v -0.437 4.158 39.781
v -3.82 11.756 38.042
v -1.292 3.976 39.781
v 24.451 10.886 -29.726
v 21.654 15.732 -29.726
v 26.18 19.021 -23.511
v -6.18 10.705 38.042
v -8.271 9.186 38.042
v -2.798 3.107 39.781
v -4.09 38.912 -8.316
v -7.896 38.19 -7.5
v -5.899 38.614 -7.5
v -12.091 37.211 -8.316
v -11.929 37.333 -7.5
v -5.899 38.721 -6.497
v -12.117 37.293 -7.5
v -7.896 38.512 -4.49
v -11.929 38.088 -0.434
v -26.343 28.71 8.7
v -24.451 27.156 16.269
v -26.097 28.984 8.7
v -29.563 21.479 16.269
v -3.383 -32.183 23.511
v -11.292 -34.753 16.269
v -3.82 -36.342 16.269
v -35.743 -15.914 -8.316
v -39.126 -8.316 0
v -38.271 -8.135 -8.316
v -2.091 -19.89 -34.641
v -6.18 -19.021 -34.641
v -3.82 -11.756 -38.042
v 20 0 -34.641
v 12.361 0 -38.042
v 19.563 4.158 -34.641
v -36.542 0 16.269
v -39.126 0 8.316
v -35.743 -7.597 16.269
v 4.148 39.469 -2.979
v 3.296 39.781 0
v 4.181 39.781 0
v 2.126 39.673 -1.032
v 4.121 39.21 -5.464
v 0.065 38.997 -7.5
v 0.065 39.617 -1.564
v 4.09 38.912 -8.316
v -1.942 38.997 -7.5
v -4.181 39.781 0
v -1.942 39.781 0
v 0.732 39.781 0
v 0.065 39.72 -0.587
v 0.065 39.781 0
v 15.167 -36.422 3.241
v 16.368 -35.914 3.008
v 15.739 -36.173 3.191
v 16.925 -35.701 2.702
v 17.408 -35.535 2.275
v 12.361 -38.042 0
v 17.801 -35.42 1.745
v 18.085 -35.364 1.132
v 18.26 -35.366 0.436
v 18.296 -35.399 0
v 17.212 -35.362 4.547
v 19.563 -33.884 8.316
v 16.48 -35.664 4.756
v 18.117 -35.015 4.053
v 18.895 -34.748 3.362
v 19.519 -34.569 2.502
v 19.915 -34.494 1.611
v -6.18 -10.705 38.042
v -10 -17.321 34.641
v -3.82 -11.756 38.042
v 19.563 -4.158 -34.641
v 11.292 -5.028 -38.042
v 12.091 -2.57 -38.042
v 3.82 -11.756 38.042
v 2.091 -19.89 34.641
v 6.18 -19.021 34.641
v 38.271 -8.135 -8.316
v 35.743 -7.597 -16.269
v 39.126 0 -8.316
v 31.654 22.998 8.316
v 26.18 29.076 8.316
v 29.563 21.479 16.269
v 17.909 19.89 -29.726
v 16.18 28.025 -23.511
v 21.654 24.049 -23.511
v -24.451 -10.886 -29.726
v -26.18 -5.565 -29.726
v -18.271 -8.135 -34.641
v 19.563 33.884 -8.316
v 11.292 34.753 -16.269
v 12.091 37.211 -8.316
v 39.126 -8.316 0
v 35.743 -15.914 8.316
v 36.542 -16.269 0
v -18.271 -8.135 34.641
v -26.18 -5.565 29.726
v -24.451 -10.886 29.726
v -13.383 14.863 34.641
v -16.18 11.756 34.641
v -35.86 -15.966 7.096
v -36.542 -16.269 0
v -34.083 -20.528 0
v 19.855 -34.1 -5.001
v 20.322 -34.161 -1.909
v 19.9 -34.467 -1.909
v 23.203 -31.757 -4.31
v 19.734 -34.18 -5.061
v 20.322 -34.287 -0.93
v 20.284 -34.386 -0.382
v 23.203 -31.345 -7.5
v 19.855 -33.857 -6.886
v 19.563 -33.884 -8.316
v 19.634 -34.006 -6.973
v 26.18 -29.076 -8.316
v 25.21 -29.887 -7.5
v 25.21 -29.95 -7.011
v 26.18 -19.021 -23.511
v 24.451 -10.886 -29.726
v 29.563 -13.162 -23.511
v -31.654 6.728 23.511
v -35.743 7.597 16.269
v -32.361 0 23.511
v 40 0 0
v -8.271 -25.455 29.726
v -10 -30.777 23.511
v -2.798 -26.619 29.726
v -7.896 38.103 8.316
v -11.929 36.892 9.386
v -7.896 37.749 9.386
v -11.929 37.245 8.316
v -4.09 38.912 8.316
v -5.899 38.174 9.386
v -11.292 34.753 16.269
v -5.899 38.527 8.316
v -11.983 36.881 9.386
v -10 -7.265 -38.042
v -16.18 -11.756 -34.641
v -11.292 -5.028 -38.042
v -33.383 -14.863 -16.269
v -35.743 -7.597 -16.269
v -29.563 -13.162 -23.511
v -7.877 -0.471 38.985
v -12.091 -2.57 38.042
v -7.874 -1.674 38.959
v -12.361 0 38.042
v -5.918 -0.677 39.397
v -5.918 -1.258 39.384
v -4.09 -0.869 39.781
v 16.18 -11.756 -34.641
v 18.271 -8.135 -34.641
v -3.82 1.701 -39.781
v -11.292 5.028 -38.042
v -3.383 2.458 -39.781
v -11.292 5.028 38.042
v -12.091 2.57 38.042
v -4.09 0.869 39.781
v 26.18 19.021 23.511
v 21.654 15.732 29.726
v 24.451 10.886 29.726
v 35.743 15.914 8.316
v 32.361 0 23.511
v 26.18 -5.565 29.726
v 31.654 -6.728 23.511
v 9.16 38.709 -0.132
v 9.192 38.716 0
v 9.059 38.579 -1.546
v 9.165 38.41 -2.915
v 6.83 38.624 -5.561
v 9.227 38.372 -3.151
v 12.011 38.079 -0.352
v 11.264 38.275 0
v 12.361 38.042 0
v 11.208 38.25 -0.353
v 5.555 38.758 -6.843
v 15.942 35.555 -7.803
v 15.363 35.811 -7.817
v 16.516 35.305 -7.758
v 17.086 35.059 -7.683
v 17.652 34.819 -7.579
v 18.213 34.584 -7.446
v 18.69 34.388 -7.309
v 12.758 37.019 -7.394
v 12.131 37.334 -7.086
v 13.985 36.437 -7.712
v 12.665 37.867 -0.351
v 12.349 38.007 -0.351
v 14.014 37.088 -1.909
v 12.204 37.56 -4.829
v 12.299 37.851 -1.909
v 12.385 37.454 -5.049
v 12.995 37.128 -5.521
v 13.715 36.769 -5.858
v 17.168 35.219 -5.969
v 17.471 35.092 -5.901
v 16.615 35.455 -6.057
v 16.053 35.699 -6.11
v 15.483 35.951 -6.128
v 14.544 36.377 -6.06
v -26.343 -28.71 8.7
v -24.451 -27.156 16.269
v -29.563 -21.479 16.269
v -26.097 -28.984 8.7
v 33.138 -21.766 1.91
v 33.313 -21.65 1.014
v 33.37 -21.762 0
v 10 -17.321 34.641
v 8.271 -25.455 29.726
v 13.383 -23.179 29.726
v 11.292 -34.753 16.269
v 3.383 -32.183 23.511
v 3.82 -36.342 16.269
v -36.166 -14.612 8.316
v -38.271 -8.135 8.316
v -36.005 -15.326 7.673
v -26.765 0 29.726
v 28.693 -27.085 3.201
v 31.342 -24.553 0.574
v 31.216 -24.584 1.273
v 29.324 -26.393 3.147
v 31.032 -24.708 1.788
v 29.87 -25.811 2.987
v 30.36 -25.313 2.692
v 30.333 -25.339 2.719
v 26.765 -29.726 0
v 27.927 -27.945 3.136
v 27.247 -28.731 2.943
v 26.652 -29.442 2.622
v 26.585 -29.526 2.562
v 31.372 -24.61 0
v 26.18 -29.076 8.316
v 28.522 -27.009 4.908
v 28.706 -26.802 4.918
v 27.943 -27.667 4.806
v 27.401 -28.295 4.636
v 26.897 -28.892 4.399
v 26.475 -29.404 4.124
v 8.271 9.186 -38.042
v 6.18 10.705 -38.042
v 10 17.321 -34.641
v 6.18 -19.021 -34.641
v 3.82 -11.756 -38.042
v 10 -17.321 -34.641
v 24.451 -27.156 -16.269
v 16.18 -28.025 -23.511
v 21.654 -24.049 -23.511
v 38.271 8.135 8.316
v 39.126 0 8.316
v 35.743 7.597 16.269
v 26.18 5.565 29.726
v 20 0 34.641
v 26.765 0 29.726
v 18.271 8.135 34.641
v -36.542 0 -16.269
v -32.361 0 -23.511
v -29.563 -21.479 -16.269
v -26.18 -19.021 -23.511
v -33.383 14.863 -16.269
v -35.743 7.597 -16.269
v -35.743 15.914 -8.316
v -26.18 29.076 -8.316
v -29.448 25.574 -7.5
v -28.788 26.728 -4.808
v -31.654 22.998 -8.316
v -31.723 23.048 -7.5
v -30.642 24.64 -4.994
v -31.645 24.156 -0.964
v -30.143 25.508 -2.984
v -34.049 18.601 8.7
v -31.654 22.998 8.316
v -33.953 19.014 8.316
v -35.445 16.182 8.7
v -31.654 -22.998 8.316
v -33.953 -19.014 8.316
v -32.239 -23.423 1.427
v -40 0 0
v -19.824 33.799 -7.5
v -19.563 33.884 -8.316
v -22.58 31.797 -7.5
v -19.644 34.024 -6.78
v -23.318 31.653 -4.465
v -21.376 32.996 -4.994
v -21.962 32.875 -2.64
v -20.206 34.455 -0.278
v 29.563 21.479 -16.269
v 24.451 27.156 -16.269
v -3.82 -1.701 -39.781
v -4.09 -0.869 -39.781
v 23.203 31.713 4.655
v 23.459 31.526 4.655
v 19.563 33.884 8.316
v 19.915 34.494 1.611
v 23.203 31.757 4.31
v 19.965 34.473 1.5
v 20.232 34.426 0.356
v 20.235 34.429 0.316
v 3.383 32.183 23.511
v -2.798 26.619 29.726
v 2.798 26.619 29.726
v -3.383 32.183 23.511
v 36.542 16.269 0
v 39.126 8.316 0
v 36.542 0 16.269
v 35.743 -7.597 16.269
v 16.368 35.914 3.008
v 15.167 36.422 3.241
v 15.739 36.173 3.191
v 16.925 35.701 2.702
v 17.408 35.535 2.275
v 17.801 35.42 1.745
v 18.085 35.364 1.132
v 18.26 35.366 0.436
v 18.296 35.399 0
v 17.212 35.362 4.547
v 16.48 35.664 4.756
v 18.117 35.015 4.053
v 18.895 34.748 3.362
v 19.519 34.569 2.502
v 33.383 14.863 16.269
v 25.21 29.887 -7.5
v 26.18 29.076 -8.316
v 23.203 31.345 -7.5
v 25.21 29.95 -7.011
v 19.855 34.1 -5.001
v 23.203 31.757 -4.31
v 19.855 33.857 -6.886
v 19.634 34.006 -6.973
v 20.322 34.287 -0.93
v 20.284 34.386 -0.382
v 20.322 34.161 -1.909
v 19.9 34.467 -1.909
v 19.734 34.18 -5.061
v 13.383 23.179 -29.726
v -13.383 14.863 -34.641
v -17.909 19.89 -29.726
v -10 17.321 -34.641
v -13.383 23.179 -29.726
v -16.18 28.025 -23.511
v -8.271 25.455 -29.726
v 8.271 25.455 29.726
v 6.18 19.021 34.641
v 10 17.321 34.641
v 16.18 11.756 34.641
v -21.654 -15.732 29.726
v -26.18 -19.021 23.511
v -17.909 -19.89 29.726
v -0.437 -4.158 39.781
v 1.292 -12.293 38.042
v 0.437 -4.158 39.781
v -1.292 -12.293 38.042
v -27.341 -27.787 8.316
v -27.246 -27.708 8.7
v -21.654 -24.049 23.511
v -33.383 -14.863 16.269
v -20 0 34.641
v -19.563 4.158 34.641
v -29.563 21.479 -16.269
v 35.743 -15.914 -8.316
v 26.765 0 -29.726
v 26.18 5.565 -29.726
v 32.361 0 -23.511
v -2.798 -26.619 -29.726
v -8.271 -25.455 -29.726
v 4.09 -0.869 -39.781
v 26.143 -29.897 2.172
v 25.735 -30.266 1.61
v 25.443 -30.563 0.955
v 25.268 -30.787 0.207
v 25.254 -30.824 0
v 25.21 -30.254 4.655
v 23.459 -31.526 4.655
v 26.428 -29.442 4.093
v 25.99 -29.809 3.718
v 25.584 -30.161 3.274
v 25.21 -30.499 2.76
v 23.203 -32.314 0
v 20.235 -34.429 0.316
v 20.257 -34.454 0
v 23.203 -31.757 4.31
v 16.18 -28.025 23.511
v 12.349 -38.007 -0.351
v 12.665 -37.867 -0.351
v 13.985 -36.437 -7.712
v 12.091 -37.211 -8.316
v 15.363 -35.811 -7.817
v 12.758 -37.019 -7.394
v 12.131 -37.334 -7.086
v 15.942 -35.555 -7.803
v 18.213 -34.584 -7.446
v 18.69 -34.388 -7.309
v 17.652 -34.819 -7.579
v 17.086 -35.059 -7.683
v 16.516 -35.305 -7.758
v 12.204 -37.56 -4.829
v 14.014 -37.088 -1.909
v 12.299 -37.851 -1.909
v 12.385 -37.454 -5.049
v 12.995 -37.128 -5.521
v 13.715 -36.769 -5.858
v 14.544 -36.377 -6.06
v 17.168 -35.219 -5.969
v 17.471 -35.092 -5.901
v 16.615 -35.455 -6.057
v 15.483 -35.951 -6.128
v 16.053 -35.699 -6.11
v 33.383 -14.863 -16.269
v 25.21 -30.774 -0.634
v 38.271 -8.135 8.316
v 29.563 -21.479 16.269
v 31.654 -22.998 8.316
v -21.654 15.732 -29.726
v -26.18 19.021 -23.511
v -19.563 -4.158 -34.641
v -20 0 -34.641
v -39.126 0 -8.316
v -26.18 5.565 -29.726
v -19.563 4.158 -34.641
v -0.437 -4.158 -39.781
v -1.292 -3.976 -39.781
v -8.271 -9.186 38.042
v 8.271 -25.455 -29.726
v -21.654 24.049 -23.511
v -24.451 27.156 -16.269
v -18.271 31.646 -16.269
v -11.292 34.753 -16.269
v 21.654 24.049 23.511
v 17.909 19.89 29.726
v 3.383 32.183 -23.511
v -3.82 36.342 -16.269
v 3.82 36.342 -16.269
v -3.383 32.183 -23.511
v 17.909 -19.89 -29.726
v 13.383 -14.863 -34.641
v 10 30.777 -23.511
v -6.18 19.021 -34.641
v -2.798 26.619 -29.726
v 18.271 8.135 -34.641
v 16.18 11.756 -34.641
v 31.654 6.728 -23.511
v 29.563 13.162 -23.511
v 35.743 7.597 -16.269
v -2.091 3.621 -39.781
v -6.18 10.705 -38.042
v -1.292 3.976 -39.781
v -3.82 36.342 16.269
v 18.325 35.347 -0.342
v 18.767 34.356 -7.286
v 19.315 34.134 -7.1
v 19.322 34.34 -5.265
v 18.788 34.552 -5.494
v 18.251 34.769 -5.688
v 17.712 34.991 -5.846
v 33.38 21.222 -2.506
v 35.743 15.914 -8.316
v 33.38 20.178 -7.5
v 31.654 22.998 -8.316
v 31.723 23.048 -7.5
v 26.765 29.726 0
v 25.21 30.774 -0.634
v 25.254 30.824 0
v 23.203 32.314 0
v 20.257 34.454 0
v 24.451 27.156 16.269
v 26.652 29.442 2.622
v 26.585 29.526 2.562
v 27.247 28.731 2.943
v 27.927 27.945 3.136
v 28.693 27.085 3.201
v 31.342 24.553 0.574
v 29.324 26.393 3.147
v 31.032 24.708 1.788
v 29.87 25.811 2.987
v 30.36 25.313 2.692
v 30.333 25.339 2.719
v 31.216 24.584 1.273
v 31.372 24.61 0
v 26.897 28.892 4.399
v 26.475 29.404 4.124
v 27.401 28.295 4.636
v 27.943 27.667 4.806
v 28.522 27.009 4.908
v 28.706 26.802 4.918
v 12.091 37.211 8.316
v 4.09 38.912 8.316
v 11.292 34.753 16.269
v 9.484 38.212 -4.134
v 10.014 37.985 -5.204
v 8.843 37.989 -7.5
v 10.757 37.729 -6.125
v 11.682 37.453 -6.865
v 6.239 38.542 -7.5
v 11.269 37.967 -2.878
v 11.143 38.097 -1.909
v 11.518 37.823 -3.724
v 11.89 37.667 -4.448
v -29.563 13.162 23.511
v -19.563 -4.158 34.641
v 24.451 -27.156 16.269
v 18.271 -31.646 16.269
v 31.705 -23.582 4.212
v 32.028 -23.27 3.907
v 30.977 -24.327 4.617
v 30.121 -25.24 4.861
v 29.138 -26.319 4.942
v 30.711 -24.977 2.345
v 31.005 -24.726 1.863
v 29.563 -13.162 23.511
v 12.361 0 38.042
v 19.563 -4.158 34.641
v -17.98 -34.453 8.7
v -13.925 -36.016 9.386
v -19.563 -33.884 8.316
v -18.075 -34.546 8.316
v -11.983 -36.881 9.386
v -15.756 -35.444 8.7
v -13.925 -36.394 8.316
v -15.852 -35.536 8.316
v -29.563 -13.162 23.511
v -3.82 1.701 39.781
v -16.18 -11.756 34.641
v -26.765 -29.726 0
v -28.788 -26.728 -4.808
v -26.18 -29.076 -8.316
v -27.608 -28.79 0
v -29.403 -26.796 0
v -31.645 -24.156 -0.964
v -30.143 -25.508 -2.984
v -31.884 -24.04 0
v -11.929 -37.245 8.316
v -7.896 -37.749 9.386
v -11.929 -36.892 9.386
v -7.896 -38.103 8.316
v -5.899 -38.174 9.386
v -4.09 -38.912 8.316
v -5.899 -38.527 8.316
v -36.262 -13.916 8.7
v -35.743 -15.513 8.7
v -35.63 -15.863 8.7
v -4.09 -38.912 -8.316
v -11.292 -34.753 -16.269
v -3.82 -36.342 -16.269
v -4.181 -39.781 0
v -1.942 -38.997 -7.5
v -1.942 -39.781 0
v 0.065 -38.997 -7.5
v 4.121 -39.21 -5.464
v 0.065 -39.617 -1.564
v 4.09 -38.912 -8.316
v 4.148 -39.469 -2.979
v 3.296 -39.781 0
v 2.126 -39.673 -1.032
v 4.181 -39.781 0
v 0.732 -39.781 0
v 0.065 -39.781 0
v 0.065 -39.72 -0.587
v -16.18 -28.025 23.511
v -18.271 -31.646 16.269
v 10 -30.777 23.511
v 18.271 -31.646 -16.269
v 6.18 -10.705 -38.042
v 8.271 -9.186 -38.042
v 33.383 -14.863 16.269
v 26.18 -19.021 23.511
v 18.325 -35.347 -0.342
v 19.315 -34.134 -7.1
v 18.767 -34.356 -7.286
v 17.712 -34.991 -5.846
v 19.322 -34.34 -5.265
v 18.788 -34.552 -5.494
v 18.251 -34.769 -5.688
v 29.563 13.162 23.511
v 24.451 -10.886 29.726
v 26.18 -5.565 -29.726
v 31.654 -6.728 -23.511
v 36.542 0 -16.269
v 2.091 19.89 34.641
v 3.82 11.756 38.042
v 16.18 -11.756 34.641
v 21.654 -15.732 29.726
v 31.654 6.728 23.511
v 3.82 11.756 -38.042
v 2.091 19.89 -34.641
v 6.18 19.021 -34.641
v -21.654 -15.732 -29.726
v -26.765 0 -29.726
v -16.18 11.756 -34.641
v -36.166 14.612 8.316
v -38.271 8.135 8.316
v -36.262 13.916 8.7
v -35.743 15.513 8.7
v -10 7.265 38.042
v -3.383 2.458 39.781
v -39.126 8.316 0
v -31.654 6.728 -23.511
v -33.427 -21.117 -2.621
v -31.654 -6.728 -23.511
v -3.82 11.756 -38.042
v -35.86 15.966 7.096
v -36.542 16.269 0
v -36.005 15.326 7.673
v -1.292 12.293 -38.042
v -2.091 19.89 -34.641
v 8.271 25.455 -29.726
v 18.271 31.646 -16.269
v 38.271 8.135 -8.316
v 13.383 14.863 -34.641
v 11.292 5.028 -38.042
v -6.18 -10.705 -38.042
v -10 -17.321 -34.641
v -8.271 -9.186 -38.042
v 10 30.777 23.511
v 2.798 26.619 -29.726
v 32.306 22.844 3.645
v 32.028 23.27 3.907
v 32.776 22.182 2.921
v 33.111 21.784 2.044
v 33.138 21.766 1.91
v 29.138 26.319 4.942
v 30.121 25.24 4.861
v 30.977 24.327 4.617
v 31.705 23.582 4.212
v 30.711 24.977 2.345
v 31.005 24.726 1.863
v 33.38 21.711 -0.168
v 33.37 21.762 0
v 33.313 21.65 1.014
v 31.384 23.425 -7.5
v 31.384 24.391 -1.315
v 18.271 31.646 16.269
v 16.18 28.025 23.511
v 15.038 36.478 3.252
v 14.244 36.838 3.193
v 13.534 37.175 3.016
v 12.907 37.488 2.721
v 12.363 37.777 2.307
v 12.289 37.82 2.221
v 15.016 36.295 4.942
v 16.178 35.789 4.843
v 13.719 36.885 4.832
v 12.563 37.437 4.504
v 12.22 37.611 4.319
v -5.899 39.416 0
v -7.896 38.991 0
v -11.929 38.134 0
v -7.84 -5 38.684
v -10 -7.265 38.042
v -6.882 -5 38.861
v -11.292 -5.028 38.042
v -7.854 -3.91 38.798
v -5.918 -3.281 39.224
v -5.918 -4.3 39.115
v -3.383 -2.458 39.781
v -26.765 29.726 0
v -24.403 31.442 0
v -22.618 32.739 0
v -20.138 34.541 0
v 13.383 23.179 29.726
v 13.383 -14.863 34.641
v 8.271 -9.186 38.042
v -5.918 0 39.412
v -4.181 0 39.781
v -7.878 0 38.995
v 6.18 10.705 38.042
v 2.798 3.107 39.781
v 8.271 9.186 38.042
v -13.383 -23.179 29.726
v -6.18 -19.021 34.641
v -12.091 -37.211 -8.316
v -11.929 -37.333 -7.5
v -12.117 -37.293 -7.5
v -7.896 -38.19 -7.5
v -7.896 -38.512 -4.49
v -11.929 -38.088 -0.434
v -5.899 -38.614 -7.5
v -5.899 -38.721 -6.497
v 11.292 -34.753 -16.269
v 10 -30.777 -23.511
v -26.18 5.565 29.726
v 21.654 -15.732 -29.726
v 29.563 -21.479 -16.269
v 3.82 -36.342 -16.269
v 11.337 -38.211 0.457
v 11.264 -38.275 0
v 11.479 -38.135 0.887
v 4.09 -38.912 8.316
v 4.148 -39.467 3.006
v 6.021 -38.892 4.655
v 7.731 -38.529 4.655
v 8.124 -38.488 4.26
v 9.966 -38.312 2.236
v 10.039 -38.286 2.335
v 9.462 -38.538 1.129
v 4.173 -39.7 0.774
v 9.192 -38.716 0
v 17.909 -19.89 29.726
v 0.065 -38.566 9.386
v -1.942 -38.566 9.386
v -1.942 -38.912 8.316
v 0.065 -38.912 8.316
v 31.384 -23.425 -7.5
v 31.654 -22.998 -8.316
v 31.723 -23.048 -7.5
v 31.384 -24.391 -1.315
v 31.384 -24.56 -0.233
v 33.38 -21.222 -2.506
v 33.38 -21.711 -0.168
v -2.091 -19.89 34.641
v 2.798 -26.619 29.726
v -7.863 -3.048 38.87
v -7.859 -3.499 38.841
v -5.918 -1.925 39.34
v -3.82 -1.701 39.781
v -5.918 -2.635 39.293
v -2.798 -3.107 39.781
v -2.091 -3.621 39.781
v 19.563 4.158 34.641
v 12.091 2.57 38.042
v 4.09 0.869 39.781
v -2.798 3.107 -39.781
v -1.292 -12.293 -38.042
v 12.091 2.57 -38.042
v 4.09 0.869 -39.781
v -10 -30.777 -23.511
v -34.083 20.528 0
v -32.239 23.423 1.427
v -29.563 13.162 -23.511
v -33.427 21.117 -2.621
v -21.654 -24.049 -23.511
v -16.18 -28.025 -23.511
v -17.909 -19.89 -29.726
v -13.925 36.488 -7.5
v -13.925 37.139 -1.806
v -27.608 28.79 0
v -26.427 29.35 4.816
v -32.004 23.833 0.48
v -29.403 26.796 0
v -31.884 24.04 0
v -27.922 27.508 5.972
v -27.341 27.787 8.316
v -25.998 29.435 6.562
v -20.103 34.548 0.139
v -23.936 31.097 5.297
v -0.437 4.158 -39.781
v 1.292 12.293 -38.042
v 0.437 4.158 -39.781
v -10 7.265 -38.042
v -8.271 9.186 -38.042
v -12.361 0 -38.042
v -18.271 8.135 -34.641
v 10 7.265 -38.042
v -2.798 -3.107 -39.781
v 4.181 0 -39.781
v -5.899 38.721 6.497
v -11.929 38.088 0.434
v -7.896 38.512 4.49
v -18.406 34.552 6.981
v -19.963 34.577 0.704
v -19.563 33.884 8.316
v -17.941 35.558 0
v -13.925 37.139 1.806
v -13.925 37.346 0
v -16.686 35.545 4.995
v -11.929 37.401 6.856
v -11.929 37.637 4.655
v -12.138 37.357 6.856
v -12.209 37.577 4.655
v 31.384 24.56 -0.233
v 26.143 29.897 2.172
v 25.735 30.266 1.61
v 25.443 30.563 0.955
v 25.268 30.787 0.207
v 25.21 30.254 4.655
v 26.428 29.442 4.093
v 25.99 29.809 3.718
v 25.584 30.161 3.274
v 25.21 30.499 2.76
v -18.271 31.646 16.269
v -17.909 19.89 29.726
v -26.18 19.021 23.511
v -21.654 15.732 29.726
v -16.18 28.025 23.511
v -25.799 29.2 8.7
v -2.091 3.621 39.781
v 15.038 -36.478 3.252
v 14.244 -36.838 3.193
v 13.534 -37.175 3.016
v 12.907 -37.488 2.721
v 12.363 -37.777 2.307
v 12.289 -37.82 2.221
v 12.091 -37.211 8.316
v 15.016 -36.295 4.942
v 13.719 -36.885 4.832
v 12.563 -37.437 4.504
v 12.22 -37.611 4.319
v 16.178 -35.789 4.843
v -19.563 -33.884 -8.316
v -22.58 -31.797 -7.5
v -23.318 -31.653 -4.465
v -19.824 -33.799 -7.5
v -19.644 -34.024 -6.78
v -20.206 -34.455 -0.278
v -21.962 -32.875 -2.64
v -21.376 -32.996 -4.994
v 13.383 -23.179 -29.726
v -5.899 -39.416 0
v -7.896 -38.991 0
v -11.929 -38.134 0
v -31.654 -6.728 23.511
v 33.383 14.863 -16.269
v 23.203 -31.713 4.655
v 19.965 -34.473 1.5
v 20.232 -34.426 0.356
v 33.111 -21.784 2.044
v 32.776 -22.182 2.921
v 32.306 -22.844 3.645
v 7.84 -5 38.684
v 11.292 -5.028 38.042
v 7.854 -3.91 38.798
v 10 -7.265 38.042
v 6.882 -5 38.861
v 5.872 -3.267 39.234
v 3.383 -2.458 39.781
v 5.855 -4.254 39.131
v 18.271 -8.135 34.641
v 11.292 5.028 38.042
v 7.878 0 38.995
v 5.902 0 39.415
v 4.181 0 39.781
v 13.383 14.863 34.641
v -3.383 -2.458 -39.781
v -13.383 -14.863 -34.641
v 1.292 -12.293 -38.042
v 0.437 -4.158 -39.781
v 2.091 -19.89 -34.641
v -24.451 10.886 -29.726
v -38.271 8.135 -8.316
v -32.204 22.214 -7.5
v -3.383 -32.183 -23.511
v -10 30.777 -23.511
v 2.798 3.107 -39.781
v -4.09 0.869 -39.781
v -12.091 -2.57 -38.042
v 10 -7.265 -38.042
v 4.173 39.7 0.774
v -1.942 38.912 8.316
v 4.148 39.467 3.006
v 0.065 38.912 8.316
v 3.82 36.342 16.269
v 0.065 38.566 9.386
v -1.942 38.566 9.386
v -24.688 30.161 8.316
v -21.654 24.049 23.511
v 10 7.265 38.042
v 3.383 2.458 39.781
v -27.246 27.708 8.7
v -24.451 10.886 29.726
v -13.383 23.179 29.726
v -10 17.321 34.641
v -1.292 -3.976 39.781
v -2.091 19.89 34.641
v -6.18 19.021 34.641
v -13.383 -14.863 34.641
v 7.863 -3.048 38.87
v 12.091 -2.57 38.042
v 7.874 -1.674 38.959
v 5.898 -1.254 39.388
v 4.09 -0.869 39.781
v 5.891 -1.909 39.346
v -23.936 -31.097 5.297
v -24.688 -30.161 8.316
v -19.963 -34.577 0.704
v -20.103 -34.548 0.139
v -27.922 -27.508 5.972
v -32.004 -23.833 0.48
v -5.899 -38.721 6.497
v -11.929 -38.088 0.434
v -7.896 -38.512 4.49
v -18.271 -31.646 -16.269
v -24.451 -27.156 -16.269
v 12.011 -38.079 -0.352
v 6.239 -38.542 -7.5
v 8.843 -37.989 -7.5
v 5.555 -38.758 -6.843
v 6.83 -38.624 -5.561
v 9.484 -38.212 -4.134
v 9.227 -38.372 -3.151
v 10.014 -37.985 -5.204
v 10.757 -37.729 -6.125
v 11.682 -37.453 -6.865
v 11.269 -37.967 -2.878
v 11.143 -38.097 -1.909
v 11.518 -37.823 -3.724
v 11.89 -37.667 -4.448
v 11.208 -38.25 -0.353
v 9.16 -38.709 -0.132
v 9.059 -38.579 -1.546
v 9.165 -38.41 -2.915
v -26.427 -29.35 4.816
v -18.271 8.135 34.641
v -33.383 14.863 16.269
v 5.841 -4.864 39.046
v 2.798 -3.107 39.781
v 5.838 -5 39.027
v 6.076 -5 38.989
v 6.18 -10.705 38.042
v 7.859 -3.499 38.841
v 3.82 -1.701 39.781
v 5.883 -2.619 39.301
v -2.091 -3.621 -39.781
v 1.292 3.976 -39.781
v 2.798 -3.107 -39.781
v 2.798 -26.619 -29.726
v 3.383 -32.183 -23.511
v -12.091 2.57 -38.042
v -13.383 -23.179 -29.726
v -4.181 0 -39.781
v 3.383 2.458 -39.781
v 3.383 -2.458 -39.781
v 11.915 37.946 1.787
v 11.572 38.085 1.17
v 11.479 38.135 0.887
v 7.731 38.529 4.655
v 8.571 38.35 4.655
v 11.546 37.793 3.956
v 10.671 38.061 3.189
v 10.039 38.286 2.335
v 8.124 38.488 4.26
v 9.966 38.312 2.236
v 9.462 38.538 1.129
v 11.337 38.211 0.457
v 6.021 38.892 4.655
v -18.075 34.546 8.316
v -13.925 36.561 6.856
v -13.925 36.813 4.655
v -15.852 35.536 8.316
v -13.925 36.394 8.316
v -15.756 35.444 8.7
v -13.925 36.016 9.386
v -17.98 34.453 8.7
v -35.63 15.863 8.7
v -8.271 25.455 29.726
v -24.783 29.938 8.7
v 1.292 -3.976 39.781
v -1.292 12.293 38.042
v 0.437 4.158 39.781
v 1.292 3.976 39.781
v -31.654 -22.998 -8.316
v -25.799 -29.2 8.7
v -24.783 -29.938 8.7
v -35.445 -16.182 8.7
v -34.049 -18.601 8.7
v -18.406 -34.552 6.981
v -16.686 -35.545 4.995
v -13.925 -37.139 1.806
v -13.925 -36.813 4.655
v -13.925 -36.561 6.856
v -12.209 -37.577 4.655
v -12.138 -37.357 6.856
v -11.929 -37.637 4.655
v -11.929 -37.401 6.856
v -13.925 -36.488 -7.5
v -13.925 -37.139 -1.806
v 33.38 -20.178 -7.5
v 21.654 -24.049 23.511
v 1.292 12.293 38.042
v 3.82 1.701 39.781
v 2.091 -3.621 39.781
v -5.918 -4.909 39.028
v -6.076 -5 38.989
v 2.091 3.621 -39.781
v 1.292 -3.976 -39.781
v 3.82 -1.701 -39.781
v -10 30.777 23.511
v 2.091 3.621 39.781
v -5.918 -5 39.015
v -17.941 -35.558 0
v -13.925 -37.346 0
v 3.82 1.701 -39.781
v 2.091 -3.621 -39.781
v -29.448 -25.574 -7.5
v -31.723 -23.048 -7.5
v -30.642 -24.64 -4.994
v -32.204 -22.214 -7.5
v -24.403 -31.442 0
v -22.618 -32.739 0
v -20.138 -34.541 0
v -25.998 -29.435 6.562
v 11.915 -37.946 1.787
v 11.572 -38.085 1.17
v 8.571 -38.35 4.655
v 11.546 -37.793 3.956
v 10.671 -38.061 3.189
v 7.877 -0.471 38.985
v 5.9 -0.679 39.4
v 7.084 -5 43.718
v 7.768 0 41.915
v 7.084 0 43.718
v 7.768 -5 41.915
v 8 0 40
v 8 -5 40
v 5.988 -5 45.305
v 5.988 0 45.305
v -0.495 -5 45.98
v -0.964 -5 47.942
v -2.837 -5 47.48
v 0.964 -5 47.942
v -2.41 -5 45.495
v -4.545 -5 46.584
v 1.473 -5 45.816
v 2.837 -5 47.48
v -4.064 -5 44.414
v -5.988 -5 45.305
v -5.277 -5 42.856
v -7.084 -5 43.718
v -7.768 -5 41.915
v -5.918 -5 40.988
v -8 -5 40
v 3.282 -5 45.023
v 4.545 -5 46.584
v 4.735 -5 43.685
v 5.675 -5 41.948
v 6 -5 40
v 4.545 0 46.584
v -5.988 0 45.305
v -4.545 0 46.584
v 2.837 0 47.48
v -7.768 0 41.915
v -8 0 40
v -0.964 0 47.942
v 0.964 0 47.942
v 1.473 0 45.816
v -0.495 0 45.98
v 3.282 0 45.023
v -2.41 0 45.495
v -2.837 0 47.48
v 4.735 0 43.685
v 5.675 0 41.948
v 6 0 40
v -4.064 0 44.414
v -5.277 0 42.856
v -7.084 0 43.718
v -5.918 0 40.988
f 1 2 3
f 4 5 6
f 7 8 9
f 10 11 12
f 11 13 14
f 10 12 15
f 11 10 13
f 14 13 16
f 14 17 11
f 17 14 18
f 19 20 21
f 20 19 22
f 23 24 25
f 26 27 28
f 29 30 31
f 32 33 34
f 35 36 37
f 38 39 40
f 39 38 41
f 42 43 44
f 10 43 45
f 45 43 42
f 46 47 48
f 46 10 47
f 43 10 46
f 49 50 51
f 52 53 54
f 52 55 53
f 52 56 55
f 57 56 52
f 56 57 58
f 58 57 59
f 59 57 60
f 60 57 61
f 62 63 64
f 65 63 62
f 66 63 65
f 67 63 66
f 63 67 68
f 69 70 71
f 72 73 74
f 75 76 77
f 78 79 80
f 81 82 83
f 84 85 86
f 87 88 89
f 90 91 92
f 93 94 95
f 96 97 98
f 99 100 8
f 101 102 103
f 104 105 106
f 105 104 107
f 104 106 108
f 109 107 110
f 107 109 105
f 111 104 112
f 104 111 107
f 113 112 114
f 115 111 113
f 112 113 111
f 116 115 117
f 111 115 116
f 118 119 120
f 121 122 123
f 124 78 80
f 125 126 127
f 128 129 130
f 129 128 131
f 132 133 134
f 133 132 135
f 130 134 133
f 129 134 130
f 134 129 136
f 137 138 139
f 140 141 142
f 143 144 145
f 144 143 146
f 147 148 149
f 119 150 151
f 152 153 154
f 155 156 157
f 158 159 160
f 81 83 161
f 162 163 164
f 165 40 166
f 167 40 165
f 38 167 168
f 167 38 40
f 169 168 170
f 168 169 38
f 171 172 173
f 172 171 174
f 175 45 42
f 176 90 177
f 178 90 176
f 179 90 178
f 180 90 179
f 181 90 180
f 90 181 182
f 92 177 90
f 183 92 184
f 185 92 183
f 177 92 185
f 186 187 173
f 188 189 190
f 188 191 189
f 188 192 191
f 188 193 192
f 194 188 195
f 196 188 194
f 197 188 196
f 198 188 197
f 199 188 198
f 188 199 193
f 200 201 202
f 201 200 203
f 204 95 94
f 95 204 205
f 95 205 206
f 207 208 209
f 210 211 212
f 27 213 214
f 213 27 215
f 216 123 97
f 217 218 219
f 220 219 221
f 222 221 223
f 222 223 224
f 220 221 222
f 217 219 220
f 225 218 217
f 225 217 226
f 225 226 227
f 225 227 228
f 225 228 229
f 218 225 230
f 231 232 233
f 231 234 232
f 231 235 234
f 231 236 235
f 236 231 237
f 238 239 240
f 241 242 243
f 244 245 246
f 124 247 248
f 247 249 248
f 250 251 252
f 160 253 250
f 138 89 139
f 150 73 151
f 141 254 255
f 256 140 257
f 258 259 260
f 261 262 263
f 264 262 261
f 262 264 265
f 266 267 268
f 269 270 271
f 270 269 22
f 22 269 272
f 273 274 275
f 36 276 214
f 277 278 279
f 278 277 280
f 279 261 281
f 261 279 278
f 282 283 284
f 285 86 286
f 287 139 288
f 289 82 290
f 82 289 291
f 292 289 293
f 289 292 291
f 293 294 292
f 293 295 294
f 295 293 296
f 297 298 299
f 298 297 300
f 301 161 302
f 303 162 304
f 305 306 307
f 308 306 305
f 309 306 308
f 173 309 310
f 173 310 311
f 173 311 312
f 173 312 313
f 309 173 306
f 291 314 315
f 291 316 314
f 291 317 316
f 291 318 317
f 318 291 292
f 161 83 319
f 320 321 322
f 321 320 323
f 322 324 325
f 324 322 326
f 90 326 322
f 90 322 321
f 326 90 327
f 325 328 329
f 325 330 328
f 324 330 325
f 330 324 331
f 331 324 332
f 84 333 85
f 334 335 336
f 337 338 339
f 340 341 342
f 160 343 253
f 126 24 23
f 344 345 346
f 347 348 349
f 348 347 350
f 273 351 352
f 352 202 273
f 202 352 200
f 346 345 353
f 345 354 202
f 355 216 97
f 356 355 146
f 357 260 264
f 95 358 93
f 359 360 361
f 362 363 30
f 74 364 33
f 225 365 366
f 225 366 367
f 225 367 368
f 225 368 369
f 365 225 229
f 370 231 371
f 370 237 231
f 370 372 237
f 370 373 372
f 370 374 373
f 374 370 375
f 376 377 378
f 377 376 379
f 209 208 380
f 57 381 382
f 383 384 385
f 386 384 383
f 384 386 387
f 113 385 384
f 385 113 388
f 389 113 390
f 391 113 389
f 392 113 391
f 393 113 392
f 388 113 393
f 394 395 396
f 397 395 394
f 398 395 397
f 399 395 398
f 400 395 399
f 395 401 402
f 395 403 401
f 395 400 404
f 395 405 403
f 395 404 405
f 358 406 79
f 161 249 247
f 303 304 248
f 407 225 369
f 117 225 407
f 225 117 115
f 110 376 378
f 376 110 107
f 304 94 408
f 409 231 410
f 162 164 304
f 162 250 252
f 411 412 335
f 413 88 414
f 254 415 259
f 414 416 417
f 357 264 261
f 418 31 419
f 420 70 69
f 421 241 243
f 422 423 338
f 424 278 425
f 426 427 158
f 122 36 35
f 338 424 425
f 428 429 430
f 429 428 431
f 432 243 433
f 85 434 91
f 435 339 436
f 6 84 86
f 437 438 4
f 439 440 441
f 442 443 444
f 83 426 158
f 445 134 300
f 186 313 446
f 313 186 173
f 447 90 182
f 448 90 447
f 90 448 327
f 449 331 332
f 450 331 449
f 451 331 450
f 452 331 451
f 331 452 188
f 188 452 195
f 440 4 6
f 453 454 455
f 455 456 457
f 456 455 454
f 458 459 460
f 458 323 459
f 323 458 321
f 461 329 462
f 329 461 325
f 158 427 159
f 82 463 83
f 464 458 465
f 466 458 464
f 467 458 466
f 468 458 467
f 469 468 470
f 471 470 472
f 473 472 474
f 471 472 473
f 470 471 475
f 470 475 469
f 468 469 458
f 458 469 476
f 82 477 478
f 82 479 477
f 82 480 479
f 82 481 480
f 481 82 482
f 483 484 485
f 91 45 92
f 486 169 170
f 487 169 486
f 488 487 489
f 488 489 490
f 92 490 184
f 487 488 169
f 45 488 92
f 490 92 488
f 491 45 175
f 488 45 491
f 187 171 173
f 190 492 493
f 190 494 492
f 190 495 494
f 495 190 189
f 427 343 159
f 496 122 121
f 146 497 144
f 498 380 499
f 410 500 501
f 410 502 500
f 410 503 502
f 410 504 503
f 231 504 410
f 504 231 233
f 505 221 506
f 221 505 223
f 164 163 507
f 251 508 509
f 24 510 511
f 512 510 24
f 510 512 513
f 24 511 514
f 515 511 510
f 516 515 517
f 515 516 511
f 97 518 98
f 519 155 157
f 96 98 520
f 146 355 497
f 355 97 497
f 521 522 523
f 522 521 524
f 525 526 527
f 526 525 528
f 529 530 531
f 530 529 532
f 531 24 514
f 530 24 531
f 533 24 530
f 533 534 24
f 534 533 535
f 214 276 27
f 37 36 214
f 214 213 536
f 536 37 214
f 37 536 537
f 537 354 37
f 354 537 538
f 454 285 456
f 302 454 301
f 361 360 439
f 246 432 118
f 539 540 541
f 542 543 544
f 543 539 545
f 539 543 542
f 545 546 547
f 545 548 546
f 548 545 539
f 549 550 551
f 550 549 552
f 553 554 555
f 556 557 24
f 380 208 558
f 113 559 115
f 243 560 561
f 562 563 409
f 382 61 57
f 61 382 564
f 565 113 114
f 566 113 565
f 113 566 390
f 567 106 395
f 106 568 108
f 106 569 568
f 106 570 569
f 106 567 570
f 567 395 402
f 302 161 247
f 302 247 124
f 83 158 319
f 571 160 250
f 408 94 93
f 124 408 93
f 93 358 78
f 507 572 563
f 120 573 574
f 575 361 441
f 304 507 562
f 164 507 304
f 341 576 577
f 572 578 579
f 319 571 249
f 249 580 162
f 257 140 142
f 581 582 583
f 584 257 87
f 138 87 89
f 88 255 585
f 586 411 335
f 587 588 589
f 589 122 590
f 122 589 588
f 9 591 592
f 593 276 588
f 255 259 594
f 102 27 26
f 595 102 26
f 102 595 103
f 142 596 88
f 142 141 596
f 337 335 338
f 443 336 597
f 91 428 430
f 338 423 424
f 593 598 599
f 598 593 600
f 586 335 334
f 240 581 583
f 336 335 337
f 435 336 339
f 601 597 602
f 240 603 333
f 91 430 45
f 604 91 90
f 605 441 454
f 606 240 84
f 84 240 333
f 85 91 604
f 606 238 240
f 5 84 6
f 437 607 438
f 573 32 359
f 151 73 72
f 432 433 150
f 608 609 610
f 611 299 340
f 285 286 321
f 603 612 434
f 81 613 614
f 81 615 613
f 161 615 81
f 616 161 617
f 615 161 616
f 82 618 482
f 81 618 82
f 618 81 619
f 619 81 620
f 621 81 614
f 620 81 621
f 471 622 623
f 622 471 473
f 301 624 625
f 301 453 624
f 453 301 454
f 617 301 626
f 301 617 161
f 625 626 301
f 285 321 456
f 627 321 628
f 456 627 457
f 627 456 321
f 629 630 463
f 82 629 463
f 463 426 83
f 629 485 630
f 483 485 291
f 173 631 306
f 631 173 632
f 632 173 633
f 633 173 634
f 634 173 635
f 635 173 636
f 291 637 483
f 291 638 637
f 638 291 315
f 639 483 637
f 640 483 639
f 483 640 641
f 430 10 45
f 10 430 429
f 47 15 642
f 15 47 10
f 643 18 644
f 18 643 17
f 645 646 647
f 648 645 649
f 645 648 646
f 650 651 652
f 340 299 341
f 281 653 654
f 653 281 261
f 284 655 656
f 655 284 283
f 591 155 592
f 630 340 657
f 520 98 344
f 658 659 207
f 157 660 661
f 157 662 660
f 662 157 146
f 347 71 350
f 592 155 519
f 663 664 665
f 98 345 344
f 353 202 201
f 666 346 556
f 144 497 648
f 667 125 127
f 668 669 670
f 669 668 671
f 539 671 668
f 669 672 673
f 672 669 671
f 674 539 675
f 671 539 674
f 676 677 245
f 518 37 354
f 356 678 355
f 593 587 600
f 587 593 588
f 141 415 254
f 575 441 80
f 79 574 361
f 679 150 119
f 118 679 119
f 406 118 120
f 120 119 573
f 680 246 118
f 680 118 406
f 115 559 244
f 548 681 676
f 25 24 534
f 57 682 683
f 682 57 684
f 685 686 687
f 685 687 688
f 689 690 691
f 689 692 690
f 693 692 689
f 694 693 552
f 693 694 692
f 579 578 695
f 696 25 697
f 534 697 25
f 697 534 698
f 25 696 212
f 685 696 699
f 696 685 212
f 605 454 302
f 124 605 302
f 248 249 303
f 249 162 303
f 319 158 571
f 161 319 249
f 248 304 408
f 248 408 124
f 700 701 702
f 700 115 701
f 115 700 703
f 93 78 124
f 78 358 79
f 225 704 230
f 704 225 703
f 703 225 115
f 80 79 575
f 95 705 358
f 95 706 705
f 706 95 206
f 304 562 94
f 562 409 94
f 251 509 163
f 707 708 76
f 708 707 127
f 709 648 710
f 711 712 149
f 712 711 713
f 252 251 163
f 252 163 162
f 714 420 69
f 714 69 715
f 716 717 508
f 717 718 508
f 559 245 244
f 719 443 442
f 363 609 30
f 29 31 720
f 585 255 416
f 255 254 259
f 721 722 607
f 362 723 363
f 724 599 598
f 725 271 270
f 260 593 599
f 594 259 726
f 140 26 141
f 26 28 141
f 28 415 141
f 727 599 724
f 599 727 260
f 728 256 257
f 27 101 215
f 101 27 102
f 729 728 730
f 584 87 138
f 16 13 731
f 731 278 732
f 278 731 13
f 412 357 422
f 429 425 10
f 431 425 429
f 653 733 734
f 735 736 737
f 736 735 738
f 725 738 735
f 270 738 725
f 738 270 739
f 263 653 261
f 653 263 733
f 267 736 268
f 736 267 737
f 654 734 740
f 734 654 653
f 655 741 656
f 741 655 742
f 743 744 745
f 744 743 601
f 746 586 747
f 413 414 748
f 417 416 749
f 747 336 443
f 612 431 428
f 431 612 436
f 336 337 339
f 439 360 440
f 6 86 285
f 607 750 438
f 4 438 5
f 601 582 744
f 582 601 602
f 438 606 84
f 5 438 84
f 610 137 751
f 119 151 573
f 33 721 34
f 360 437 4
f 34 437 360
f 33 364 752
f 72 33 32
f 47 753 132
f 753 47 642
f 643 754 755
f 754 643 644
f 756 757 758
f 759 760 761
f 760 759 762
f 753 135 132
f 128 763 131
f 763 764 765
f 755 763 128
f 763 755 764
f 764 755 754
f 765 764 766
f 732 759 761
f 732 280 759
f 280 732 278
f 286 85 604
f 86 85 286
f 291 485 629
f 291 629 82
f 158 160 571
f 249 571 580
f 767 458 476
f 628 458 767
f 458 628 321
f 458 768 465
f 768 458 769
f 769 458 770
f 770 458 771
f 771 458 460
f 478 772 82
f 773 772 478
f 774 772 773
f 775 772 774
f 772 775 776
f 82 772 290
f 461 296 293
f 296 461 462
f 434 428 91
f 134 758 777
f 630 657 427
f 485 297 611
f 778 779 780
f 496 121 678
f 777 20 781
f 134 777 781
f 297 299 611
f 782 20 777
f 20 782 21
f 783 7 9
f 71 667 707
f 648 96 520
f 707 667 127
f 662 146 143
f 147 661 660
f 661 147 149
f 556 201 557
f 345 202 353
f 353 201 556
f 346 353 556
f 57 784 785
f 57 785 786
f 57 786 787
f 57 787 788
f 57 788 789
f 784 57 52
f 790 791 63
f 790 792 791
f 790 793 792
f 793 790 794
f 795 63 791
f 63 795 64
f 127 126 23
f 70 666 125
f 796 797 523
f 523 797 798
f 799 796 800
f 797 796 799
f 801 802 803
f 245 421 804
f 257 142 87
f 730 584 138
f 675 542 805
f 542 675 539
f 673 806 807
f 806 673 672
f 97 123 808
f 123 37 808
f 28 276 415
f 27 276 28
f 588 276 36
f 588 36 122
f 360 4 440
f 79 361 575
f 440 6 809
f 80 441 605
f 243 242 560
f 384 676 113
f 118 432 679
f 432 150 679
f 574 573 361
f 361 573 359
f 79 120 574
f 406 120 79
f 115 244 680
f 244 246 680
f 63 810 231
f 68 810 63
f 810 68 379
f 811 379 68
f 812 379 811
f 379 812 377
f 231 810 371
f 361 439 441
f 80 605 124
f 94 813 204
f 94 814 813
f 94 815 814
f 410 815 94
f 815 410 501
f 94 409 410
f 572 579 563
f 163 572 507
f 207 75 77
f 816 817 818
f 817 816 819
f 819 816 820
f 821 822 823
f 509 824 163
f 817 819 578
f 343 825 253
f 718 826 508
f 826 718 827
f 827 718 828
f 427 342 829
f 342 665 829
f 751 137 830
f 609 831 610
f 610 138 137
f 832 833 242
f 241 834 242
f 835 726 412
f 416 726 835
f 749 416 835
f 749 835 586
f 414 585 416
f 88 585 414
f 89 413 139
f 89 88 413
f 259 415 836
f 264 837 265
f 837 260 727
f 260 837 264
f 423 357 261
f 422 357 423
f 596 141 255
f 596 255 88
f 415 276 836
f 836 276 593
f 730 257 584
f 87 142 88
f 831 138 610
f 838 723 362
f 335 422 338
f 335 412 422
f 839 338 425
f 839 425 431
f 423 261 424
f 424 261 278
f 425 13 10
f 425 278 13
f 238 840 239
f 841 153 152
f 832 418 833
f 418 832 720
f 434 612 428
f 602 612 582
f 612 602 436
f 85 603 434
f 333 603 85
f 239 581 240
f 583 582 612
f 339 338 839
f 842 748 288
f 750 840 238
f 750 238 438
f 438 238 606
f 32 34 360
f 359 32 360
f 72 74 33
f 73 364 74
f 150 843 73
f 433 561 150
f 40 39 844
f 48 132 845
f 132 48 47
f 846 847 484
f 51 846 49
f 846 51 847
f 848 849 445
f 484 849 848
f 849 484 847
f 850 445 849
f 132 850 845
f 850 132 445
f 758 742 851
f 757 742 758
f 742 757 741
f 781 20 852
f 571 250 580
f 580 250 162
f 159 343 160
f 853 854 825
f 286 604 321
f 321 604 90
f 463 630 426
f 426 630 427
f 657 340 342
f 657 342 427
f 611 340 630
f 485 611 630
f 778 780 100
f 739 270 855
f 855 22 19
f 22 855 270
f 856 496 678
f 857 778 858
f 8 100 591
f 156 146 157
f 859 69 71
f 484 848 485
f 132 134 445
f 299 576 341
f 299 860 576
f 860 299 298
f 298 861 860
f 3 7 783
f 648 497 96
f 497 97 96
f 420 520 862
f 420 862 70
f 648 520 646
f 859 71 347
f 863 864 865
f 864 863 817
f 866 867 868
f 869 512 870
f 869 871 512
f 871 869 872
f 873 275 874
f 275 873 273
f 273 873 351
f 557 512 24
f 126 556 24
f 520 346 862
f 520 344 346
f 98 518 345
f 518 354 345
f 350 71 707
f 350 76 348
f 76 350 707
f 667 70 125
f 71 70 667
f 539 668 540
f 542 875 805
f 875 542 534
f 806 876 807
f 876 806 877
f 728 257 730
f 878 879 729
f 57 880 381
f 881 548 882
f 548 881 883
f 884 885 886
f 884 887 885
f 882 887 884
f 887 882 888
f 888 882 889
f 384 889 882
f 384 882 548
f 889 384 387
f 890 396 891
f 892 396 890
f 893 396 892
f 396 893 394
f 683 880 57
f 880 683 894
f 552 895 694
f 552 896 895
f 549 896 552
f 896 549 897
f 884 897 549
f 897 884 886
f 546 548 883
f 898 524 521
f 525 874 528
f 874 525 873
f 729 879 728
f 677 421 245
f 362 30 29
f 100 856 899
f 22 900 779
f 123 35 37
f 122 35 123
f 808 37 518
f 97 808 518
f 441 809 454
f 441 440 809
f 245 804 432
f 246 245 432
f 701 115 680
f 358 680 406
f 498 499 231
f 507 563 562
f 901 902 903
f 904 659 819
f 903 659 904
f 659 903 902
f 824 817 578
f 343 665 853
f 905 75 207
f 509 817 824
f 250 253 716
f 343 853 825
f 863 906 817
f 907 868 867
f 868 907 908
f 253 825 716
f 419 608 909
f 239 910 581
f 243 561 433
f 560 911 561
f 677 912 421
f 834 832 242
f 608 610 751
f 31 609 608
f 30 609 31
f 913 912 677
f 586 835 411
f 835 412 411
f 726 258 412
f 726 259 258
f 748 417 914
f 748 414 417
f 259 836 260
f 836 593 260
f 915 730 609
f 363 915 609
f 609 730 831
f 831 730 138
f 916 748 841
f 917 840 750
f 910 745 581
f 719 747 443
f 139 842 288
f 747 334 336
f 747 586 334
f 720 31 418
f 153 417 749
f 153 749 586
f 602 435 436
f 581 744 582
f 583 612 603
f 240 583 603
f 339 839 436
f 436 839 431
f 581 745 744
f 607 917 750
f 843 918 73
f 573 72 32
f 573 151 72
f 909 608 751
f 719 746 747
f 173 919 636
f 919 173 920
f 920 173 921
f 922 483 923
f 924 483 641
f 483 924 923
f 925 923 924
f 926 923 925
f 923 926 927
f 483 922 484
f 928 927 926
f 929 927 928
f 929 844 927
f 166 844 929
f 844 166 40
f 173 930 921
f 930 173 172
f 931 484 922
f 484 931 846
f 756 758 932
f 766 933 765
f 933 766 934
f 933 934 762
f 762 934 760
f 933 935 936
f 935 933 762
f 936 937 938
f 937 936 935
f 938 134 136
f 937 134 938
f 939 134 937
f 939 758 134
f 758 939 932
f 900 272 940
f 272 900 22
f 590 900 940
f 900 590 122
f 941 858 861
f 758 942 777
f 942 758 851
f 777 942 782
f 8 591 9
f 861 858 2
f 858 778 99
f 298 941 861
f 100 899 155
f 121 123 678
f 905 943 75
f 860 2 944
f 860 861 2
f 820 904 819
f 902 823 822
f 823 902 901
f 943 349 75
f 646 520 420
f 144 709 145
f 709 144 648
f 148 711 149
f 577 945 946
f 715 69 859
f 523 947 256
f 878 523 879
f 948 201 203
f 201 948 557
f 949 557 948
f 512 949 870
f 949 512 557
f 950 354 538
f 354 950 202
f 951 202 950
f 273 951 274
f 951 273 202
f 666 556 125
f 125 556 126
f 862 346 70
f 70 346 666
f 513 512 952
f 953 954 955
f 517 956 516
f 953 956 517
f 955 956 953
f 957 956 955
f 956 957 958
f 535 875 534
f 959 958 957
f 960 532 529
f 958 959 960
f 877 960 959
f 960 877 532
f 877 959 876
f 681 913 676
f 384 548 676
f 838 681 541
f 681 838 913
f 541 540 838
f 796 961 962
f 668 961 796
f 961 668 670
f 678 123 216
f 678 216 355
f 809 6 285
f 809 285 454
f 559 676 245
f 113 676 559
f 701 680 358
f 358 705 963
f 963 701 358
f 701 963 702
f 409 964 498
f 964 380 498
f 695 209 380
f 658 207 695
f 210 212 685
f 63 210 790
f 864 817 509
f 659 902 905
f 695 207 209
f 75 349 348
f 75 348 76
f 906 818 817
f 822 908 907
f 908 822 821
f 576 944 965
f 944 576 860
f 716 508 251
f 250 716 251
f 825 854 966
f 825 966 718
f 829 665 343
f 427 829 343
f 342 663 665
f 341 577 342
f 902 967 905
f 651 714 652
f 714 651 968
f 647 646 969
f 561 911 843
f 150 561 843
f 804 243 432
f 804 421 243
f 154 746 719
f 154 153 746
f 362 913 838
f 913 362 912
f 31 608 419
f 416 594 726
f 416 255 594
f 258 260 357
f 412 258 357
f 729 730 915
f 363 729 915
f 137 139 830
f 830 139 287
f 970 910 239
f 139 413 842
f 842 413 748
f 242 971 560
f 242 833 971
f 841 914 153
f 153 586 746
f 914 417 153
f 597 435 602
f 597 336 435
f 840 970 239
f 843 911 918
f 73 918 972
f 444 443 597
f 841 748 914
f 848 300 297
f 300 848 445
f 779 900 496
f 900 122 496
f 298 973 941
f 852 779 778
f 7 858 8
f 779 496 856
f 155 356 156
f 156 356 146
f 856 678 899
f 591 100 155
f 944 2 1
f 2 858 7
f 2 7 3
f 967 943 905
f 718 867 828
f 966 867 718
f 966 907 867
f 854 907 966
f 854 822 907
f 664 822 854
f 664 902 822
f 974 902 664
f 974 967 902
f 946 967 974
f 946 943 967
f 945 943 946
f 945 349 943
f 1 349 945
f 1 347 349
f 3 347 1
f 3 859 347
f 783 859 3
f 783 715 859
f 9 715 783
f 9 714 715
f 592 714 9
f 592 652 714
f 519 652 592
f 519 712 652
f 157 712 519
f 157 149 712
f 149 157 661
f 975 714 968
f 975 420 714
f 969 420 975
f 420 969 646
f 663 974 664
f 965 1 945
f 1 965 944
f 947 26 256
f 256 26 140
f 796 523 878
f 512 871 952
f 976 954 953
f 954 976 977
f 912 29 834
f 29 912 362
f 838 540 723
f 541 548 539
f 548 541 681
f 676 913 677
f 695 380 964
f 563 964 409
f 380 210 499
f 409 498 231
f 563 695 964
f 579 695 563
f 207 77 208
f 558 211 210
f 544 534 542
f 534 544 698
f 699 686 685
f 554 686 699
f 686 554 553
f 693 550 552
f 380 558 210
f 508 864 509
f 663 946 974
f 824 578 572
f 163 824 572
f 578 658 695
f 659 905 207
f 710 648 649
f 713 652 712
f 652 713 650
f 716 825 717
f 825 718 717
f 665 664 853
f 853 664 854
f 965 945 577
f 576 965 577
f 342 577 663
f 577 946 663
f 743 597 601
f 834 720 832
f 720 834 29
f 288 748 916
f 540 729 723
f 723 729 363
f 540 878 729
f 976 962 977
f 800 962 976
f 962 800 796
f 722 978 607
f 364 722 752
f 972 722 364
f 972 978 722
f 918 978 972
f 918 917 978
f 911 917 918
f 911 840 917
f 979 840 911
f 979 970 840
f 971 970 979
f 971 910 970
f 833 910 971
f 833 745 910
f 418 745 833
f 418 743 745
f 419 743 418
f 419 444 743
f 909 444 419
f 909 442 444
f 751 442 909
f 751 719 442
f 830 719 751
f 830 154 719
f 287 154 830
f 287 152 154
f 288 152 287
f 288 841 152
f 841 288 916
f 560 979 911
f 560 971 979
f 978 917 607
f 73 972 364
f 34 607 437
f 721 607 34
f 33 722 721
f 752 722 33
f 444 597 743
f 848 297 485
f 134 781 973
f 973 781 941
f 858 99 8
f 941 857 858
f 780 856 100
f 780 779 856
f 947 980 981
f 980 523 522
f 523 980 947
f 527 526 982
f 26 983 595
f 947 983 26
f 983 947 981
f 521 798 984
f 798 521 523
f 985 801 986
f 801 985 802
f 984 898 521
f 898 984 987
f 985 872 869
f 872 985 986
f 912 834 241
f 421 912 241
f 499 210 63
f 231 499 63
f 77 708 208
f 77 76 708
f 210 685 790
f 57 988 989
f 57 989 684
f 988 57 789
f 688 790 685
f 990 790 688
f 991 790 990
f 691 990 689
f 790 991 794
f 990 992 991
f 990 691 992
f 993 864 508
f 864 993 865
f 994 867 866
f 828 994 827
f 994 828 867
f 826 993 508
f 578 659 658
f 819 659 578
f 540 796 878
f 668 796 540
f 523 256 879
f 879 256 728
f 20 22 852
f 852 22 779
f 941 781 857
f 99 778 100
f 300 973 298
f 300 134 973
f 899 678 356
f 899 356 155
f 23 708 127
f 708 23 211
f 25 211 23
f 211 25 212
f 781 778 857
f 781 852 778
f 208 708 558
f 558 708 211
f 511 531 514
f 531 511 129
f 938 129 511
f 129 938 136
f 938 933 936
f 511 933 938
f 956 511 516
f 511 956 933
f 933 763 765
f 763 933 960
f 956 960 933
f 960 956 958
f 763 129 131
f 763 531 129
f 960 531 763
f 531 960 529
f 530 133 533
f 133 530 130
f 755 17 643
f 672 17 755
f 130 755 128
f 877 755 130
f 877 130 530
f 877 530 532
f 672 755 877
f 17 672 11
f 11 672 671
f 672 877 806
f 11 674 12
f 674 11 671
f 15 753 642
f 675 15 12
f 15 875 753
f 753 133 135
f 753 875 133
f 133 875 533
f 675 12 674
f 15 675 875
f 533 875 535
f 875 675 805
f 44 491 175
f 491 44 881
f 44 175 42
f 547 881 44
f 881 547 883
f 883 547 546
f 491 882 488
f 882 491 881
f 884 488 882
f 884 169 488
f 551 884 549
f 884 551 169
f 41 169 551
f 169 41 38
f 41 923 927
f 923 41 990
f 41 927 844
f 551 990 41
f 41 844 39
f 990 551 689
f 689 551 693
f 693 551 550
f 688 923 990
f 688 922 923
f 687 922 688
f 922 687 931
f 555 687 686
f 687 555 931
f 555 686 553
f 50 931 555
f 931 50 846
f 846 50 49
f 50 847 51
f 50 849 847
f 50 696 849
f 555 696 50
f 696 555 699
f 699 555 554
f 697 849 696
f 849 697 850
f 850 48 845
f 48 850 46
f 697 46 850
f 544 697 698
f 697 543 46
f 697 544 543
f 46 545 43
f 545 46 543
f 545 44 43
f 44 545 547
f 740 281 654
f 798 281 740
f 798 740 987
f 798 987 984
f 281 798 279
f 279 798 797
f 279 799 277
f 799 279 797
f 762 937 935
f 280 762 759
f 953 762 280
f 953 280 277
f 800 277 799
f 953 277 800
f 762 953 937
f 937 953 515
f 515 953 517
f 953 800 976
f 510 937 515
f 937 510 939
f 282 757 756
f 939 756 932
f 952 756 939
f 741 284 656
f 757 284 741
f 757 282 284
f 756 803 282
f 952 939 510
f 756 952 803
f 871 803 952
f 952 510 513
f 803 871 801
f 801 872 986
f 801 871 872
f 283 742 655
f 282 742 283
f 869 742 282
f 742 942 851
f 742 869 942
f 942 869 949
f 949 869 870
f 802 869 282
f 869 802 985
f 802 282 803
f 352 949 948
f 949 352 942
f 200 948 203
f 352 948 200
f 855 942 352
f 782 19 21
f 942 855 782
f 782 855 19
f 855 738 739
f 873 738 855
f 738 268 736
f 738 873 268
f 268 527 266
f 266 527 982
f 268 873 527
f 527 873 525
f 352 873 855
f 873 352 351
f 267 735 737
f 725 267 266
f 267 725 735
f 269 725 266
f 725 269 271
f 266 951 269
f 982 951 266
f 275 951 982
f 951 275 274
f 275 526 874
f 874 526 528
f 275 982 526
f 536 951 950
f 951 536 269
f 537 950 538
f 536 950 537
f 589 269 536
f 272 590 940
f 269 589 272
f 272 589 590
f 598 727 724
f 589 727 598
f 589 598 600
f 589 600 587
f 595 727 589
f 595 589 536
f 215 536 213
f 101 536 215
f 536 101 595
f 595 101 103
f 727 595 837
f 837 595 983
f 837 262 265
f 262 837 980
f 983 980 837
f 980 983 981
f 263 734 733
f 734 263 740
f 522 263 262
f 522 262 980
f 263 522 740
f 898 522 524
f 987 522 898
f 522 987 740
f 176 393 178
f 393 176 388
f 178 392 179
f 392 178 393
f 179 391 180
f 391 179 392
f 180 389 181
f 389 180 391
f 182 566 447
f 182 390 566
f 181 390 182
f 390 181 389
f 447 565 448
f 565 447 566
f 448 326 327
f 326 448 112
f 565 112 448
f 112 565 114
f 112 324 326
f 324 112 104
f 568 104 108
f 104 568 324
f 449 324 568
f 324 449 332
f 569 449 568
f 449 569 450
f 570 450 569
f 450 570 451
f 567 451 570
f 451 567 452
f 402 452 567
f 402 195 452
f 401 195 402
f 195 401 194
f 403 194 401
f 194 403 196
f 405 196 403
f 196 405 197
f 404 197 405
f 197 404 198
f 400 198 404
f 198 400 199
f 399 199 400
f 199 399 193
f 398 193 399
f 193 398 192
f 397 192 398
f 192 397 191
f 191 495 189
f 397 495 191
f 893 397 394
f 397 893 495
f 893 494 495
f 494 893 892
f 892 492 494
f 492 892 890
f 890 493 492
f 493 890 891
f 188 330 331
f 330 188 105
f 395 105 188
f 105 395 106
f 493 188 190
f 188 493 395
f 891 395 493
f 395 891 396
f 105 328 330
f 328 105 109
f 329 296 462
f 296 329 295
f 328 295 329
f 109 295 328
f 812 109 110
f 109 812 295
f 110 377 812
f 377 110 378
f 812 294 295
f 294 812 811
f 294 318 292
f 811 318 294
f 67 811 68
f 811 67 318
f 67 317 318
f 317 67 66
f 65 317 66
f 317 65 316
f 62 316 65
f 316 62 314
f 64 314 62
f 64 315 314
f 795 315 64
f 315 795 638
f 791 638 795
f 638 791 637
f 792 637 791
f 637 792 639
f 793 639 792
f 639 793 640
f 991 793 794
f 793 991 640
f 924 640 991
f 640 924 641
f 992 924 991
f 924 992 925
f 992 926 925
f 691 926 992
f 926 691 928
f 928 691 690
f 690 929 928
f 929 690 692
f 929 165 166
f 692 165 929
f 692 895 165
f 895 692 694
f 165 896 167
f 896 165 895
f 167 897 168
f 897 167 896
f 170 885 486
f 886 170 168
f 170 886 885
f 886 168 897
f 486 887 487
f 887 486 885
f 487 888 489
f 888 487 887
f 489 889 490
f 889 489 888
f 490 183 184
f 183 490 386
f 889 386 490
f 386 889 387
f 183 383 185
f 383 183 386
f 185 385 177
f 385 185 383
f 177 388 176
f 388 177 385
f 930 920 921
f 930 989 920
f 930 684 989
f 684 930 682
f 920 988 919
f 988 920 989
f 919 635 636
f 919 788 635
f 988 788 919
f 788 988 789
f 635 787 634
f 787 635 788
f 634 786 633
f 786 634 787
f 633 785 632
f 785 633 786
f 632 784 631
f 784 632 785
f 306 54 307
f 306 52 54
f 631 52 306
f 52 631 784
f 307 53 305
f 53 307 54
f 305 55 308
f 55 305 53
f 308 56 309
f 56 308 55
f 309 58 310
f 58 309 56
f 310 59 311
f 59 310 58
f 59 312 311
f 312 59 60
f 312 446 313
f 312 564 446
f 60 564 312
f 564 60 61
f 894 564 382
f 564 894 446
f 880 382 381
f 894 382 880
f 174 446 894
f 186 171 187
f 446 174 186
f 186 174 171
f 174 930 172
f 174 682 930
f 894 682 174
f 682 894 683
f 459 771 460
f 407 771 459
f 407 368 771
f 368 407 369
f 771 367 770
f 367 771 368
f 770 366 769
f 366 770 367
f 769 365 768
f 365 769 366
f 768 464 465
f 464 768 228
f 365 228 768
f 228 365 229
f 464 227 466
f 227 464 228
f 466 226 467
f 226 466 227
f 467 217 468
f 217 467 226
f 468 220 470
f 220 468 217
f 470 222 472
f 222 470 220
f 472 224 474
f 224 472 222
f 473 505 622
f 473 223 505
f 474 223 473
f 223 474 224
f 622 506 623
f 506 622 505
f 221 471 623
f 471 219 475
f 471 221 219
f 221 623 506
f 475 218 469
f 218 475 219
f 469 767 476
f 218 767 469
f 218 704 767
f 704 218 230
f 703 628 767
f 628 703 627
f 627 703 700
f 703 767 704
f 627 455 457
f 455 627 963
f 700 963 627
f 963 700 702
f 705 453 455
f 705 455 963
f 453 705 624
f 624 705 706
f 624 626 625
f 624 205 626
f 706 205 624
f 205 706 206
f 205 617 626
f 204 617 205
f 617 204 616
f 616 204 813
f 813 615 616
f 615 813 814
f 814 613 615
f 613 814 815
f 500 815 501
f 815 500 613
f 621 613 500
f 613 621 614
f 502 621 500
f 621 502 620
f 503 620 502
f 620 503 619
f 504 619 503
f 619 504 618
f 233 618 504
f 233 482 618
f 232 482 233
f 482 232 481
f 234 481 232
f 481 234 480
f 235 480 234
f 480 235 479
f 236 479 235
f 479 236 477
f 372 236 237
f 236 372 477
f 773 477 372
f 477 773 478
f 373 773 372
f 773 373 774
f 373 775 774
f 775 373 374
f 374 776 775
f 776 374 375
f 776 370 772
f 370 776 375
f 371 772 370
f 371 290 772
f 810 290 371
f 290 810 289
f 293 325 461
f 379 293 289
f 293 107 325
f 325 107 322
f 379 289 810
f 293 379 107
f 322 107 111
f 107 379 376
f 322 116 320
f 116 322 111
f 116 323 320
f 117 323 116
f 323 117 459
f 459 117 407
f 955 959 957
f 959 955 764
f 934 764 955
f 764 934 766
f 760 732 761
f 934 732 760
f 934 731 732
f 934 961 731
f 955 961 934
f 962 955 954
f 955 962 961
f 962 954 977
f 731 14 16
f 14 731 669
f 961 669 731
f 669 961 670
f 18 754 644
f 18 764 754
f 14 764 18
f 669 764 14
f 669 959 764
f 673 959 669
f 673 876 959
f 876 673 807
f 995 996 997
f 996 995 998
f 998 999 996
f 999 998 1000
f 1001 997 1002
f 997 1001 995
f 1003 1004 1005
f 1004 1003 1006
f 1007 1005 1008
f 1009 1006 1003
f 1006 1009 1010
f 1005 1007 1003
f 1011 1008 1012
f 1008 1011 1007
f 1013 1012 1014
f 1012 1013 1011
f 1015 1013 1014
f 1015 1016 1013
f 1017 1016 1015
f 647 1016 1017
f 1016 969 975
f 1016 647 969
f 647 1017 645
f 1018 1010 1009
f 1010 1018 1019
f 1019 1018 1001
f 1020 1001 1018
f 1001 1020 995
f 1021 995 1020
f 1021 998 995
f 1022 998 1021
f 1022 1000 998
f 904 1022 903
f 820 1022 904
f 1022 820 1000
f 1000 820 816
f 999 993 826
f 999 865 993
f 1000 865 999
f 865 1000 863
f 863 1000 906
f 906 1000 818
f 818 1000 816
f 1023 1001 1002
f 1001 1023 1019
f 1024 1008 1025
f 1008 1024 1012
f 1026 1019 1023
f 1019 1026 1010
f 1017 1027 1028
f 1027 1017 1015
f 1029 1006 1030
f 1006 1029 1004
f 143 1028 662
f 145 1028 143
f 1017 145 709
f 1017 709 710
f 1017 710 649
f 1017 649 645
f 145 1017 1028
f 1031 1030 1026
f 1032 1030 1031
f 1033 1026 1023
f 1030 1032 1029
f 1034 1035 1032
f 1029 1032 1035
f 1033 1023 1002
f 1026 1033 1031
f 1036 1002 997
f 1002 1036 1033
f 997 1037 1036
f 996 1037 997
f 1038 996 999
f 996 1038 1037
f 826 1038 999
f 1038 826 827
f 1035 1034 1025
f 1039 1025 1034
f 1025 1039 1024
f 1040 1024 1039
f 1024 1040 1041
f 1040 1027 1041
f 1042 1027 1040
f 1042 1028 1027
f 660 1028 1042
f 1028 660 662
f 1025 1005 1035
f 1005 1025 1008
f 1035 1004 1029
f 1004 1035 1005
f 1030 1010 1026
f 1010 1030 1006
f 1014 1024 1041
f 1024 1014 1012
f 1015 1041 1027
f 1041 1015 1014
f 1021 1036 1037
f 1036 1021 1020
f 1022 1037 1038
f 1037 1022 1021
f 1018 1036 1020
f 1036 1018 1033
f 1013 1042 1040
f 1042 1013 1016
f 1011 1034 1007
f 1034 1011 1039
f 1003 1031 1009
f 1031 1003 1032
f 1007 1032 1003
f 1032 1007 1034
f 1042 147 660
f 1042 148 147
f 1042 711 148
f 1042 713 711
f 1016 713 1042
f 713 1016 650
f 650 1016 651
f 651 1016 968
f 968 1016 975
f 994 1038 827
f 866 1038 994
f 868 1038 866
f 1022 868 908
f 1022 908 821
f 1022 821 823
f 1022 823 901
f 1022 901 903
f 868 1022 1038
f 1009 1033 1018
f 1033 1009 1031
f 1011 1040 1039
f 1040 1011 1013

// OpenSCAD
diameter = 80;

difference() {
    sphere(r=diameter / 2);
    translate([-37, diameter/2 + 5, -7.5]) rotate([90, 0, 0]) linear_extrude(height = diameter + 10) text(text = "Wilken", font = "CutOutsFLF:style=Regular", size = 16);
}

translate([0, 0, diameter / 2]) rotate([90, 0, 0])  difference() {
    cylinder(r=8,  5);
    translate([0, 0, 0]) cylinder(r=6, 5);
    
}
